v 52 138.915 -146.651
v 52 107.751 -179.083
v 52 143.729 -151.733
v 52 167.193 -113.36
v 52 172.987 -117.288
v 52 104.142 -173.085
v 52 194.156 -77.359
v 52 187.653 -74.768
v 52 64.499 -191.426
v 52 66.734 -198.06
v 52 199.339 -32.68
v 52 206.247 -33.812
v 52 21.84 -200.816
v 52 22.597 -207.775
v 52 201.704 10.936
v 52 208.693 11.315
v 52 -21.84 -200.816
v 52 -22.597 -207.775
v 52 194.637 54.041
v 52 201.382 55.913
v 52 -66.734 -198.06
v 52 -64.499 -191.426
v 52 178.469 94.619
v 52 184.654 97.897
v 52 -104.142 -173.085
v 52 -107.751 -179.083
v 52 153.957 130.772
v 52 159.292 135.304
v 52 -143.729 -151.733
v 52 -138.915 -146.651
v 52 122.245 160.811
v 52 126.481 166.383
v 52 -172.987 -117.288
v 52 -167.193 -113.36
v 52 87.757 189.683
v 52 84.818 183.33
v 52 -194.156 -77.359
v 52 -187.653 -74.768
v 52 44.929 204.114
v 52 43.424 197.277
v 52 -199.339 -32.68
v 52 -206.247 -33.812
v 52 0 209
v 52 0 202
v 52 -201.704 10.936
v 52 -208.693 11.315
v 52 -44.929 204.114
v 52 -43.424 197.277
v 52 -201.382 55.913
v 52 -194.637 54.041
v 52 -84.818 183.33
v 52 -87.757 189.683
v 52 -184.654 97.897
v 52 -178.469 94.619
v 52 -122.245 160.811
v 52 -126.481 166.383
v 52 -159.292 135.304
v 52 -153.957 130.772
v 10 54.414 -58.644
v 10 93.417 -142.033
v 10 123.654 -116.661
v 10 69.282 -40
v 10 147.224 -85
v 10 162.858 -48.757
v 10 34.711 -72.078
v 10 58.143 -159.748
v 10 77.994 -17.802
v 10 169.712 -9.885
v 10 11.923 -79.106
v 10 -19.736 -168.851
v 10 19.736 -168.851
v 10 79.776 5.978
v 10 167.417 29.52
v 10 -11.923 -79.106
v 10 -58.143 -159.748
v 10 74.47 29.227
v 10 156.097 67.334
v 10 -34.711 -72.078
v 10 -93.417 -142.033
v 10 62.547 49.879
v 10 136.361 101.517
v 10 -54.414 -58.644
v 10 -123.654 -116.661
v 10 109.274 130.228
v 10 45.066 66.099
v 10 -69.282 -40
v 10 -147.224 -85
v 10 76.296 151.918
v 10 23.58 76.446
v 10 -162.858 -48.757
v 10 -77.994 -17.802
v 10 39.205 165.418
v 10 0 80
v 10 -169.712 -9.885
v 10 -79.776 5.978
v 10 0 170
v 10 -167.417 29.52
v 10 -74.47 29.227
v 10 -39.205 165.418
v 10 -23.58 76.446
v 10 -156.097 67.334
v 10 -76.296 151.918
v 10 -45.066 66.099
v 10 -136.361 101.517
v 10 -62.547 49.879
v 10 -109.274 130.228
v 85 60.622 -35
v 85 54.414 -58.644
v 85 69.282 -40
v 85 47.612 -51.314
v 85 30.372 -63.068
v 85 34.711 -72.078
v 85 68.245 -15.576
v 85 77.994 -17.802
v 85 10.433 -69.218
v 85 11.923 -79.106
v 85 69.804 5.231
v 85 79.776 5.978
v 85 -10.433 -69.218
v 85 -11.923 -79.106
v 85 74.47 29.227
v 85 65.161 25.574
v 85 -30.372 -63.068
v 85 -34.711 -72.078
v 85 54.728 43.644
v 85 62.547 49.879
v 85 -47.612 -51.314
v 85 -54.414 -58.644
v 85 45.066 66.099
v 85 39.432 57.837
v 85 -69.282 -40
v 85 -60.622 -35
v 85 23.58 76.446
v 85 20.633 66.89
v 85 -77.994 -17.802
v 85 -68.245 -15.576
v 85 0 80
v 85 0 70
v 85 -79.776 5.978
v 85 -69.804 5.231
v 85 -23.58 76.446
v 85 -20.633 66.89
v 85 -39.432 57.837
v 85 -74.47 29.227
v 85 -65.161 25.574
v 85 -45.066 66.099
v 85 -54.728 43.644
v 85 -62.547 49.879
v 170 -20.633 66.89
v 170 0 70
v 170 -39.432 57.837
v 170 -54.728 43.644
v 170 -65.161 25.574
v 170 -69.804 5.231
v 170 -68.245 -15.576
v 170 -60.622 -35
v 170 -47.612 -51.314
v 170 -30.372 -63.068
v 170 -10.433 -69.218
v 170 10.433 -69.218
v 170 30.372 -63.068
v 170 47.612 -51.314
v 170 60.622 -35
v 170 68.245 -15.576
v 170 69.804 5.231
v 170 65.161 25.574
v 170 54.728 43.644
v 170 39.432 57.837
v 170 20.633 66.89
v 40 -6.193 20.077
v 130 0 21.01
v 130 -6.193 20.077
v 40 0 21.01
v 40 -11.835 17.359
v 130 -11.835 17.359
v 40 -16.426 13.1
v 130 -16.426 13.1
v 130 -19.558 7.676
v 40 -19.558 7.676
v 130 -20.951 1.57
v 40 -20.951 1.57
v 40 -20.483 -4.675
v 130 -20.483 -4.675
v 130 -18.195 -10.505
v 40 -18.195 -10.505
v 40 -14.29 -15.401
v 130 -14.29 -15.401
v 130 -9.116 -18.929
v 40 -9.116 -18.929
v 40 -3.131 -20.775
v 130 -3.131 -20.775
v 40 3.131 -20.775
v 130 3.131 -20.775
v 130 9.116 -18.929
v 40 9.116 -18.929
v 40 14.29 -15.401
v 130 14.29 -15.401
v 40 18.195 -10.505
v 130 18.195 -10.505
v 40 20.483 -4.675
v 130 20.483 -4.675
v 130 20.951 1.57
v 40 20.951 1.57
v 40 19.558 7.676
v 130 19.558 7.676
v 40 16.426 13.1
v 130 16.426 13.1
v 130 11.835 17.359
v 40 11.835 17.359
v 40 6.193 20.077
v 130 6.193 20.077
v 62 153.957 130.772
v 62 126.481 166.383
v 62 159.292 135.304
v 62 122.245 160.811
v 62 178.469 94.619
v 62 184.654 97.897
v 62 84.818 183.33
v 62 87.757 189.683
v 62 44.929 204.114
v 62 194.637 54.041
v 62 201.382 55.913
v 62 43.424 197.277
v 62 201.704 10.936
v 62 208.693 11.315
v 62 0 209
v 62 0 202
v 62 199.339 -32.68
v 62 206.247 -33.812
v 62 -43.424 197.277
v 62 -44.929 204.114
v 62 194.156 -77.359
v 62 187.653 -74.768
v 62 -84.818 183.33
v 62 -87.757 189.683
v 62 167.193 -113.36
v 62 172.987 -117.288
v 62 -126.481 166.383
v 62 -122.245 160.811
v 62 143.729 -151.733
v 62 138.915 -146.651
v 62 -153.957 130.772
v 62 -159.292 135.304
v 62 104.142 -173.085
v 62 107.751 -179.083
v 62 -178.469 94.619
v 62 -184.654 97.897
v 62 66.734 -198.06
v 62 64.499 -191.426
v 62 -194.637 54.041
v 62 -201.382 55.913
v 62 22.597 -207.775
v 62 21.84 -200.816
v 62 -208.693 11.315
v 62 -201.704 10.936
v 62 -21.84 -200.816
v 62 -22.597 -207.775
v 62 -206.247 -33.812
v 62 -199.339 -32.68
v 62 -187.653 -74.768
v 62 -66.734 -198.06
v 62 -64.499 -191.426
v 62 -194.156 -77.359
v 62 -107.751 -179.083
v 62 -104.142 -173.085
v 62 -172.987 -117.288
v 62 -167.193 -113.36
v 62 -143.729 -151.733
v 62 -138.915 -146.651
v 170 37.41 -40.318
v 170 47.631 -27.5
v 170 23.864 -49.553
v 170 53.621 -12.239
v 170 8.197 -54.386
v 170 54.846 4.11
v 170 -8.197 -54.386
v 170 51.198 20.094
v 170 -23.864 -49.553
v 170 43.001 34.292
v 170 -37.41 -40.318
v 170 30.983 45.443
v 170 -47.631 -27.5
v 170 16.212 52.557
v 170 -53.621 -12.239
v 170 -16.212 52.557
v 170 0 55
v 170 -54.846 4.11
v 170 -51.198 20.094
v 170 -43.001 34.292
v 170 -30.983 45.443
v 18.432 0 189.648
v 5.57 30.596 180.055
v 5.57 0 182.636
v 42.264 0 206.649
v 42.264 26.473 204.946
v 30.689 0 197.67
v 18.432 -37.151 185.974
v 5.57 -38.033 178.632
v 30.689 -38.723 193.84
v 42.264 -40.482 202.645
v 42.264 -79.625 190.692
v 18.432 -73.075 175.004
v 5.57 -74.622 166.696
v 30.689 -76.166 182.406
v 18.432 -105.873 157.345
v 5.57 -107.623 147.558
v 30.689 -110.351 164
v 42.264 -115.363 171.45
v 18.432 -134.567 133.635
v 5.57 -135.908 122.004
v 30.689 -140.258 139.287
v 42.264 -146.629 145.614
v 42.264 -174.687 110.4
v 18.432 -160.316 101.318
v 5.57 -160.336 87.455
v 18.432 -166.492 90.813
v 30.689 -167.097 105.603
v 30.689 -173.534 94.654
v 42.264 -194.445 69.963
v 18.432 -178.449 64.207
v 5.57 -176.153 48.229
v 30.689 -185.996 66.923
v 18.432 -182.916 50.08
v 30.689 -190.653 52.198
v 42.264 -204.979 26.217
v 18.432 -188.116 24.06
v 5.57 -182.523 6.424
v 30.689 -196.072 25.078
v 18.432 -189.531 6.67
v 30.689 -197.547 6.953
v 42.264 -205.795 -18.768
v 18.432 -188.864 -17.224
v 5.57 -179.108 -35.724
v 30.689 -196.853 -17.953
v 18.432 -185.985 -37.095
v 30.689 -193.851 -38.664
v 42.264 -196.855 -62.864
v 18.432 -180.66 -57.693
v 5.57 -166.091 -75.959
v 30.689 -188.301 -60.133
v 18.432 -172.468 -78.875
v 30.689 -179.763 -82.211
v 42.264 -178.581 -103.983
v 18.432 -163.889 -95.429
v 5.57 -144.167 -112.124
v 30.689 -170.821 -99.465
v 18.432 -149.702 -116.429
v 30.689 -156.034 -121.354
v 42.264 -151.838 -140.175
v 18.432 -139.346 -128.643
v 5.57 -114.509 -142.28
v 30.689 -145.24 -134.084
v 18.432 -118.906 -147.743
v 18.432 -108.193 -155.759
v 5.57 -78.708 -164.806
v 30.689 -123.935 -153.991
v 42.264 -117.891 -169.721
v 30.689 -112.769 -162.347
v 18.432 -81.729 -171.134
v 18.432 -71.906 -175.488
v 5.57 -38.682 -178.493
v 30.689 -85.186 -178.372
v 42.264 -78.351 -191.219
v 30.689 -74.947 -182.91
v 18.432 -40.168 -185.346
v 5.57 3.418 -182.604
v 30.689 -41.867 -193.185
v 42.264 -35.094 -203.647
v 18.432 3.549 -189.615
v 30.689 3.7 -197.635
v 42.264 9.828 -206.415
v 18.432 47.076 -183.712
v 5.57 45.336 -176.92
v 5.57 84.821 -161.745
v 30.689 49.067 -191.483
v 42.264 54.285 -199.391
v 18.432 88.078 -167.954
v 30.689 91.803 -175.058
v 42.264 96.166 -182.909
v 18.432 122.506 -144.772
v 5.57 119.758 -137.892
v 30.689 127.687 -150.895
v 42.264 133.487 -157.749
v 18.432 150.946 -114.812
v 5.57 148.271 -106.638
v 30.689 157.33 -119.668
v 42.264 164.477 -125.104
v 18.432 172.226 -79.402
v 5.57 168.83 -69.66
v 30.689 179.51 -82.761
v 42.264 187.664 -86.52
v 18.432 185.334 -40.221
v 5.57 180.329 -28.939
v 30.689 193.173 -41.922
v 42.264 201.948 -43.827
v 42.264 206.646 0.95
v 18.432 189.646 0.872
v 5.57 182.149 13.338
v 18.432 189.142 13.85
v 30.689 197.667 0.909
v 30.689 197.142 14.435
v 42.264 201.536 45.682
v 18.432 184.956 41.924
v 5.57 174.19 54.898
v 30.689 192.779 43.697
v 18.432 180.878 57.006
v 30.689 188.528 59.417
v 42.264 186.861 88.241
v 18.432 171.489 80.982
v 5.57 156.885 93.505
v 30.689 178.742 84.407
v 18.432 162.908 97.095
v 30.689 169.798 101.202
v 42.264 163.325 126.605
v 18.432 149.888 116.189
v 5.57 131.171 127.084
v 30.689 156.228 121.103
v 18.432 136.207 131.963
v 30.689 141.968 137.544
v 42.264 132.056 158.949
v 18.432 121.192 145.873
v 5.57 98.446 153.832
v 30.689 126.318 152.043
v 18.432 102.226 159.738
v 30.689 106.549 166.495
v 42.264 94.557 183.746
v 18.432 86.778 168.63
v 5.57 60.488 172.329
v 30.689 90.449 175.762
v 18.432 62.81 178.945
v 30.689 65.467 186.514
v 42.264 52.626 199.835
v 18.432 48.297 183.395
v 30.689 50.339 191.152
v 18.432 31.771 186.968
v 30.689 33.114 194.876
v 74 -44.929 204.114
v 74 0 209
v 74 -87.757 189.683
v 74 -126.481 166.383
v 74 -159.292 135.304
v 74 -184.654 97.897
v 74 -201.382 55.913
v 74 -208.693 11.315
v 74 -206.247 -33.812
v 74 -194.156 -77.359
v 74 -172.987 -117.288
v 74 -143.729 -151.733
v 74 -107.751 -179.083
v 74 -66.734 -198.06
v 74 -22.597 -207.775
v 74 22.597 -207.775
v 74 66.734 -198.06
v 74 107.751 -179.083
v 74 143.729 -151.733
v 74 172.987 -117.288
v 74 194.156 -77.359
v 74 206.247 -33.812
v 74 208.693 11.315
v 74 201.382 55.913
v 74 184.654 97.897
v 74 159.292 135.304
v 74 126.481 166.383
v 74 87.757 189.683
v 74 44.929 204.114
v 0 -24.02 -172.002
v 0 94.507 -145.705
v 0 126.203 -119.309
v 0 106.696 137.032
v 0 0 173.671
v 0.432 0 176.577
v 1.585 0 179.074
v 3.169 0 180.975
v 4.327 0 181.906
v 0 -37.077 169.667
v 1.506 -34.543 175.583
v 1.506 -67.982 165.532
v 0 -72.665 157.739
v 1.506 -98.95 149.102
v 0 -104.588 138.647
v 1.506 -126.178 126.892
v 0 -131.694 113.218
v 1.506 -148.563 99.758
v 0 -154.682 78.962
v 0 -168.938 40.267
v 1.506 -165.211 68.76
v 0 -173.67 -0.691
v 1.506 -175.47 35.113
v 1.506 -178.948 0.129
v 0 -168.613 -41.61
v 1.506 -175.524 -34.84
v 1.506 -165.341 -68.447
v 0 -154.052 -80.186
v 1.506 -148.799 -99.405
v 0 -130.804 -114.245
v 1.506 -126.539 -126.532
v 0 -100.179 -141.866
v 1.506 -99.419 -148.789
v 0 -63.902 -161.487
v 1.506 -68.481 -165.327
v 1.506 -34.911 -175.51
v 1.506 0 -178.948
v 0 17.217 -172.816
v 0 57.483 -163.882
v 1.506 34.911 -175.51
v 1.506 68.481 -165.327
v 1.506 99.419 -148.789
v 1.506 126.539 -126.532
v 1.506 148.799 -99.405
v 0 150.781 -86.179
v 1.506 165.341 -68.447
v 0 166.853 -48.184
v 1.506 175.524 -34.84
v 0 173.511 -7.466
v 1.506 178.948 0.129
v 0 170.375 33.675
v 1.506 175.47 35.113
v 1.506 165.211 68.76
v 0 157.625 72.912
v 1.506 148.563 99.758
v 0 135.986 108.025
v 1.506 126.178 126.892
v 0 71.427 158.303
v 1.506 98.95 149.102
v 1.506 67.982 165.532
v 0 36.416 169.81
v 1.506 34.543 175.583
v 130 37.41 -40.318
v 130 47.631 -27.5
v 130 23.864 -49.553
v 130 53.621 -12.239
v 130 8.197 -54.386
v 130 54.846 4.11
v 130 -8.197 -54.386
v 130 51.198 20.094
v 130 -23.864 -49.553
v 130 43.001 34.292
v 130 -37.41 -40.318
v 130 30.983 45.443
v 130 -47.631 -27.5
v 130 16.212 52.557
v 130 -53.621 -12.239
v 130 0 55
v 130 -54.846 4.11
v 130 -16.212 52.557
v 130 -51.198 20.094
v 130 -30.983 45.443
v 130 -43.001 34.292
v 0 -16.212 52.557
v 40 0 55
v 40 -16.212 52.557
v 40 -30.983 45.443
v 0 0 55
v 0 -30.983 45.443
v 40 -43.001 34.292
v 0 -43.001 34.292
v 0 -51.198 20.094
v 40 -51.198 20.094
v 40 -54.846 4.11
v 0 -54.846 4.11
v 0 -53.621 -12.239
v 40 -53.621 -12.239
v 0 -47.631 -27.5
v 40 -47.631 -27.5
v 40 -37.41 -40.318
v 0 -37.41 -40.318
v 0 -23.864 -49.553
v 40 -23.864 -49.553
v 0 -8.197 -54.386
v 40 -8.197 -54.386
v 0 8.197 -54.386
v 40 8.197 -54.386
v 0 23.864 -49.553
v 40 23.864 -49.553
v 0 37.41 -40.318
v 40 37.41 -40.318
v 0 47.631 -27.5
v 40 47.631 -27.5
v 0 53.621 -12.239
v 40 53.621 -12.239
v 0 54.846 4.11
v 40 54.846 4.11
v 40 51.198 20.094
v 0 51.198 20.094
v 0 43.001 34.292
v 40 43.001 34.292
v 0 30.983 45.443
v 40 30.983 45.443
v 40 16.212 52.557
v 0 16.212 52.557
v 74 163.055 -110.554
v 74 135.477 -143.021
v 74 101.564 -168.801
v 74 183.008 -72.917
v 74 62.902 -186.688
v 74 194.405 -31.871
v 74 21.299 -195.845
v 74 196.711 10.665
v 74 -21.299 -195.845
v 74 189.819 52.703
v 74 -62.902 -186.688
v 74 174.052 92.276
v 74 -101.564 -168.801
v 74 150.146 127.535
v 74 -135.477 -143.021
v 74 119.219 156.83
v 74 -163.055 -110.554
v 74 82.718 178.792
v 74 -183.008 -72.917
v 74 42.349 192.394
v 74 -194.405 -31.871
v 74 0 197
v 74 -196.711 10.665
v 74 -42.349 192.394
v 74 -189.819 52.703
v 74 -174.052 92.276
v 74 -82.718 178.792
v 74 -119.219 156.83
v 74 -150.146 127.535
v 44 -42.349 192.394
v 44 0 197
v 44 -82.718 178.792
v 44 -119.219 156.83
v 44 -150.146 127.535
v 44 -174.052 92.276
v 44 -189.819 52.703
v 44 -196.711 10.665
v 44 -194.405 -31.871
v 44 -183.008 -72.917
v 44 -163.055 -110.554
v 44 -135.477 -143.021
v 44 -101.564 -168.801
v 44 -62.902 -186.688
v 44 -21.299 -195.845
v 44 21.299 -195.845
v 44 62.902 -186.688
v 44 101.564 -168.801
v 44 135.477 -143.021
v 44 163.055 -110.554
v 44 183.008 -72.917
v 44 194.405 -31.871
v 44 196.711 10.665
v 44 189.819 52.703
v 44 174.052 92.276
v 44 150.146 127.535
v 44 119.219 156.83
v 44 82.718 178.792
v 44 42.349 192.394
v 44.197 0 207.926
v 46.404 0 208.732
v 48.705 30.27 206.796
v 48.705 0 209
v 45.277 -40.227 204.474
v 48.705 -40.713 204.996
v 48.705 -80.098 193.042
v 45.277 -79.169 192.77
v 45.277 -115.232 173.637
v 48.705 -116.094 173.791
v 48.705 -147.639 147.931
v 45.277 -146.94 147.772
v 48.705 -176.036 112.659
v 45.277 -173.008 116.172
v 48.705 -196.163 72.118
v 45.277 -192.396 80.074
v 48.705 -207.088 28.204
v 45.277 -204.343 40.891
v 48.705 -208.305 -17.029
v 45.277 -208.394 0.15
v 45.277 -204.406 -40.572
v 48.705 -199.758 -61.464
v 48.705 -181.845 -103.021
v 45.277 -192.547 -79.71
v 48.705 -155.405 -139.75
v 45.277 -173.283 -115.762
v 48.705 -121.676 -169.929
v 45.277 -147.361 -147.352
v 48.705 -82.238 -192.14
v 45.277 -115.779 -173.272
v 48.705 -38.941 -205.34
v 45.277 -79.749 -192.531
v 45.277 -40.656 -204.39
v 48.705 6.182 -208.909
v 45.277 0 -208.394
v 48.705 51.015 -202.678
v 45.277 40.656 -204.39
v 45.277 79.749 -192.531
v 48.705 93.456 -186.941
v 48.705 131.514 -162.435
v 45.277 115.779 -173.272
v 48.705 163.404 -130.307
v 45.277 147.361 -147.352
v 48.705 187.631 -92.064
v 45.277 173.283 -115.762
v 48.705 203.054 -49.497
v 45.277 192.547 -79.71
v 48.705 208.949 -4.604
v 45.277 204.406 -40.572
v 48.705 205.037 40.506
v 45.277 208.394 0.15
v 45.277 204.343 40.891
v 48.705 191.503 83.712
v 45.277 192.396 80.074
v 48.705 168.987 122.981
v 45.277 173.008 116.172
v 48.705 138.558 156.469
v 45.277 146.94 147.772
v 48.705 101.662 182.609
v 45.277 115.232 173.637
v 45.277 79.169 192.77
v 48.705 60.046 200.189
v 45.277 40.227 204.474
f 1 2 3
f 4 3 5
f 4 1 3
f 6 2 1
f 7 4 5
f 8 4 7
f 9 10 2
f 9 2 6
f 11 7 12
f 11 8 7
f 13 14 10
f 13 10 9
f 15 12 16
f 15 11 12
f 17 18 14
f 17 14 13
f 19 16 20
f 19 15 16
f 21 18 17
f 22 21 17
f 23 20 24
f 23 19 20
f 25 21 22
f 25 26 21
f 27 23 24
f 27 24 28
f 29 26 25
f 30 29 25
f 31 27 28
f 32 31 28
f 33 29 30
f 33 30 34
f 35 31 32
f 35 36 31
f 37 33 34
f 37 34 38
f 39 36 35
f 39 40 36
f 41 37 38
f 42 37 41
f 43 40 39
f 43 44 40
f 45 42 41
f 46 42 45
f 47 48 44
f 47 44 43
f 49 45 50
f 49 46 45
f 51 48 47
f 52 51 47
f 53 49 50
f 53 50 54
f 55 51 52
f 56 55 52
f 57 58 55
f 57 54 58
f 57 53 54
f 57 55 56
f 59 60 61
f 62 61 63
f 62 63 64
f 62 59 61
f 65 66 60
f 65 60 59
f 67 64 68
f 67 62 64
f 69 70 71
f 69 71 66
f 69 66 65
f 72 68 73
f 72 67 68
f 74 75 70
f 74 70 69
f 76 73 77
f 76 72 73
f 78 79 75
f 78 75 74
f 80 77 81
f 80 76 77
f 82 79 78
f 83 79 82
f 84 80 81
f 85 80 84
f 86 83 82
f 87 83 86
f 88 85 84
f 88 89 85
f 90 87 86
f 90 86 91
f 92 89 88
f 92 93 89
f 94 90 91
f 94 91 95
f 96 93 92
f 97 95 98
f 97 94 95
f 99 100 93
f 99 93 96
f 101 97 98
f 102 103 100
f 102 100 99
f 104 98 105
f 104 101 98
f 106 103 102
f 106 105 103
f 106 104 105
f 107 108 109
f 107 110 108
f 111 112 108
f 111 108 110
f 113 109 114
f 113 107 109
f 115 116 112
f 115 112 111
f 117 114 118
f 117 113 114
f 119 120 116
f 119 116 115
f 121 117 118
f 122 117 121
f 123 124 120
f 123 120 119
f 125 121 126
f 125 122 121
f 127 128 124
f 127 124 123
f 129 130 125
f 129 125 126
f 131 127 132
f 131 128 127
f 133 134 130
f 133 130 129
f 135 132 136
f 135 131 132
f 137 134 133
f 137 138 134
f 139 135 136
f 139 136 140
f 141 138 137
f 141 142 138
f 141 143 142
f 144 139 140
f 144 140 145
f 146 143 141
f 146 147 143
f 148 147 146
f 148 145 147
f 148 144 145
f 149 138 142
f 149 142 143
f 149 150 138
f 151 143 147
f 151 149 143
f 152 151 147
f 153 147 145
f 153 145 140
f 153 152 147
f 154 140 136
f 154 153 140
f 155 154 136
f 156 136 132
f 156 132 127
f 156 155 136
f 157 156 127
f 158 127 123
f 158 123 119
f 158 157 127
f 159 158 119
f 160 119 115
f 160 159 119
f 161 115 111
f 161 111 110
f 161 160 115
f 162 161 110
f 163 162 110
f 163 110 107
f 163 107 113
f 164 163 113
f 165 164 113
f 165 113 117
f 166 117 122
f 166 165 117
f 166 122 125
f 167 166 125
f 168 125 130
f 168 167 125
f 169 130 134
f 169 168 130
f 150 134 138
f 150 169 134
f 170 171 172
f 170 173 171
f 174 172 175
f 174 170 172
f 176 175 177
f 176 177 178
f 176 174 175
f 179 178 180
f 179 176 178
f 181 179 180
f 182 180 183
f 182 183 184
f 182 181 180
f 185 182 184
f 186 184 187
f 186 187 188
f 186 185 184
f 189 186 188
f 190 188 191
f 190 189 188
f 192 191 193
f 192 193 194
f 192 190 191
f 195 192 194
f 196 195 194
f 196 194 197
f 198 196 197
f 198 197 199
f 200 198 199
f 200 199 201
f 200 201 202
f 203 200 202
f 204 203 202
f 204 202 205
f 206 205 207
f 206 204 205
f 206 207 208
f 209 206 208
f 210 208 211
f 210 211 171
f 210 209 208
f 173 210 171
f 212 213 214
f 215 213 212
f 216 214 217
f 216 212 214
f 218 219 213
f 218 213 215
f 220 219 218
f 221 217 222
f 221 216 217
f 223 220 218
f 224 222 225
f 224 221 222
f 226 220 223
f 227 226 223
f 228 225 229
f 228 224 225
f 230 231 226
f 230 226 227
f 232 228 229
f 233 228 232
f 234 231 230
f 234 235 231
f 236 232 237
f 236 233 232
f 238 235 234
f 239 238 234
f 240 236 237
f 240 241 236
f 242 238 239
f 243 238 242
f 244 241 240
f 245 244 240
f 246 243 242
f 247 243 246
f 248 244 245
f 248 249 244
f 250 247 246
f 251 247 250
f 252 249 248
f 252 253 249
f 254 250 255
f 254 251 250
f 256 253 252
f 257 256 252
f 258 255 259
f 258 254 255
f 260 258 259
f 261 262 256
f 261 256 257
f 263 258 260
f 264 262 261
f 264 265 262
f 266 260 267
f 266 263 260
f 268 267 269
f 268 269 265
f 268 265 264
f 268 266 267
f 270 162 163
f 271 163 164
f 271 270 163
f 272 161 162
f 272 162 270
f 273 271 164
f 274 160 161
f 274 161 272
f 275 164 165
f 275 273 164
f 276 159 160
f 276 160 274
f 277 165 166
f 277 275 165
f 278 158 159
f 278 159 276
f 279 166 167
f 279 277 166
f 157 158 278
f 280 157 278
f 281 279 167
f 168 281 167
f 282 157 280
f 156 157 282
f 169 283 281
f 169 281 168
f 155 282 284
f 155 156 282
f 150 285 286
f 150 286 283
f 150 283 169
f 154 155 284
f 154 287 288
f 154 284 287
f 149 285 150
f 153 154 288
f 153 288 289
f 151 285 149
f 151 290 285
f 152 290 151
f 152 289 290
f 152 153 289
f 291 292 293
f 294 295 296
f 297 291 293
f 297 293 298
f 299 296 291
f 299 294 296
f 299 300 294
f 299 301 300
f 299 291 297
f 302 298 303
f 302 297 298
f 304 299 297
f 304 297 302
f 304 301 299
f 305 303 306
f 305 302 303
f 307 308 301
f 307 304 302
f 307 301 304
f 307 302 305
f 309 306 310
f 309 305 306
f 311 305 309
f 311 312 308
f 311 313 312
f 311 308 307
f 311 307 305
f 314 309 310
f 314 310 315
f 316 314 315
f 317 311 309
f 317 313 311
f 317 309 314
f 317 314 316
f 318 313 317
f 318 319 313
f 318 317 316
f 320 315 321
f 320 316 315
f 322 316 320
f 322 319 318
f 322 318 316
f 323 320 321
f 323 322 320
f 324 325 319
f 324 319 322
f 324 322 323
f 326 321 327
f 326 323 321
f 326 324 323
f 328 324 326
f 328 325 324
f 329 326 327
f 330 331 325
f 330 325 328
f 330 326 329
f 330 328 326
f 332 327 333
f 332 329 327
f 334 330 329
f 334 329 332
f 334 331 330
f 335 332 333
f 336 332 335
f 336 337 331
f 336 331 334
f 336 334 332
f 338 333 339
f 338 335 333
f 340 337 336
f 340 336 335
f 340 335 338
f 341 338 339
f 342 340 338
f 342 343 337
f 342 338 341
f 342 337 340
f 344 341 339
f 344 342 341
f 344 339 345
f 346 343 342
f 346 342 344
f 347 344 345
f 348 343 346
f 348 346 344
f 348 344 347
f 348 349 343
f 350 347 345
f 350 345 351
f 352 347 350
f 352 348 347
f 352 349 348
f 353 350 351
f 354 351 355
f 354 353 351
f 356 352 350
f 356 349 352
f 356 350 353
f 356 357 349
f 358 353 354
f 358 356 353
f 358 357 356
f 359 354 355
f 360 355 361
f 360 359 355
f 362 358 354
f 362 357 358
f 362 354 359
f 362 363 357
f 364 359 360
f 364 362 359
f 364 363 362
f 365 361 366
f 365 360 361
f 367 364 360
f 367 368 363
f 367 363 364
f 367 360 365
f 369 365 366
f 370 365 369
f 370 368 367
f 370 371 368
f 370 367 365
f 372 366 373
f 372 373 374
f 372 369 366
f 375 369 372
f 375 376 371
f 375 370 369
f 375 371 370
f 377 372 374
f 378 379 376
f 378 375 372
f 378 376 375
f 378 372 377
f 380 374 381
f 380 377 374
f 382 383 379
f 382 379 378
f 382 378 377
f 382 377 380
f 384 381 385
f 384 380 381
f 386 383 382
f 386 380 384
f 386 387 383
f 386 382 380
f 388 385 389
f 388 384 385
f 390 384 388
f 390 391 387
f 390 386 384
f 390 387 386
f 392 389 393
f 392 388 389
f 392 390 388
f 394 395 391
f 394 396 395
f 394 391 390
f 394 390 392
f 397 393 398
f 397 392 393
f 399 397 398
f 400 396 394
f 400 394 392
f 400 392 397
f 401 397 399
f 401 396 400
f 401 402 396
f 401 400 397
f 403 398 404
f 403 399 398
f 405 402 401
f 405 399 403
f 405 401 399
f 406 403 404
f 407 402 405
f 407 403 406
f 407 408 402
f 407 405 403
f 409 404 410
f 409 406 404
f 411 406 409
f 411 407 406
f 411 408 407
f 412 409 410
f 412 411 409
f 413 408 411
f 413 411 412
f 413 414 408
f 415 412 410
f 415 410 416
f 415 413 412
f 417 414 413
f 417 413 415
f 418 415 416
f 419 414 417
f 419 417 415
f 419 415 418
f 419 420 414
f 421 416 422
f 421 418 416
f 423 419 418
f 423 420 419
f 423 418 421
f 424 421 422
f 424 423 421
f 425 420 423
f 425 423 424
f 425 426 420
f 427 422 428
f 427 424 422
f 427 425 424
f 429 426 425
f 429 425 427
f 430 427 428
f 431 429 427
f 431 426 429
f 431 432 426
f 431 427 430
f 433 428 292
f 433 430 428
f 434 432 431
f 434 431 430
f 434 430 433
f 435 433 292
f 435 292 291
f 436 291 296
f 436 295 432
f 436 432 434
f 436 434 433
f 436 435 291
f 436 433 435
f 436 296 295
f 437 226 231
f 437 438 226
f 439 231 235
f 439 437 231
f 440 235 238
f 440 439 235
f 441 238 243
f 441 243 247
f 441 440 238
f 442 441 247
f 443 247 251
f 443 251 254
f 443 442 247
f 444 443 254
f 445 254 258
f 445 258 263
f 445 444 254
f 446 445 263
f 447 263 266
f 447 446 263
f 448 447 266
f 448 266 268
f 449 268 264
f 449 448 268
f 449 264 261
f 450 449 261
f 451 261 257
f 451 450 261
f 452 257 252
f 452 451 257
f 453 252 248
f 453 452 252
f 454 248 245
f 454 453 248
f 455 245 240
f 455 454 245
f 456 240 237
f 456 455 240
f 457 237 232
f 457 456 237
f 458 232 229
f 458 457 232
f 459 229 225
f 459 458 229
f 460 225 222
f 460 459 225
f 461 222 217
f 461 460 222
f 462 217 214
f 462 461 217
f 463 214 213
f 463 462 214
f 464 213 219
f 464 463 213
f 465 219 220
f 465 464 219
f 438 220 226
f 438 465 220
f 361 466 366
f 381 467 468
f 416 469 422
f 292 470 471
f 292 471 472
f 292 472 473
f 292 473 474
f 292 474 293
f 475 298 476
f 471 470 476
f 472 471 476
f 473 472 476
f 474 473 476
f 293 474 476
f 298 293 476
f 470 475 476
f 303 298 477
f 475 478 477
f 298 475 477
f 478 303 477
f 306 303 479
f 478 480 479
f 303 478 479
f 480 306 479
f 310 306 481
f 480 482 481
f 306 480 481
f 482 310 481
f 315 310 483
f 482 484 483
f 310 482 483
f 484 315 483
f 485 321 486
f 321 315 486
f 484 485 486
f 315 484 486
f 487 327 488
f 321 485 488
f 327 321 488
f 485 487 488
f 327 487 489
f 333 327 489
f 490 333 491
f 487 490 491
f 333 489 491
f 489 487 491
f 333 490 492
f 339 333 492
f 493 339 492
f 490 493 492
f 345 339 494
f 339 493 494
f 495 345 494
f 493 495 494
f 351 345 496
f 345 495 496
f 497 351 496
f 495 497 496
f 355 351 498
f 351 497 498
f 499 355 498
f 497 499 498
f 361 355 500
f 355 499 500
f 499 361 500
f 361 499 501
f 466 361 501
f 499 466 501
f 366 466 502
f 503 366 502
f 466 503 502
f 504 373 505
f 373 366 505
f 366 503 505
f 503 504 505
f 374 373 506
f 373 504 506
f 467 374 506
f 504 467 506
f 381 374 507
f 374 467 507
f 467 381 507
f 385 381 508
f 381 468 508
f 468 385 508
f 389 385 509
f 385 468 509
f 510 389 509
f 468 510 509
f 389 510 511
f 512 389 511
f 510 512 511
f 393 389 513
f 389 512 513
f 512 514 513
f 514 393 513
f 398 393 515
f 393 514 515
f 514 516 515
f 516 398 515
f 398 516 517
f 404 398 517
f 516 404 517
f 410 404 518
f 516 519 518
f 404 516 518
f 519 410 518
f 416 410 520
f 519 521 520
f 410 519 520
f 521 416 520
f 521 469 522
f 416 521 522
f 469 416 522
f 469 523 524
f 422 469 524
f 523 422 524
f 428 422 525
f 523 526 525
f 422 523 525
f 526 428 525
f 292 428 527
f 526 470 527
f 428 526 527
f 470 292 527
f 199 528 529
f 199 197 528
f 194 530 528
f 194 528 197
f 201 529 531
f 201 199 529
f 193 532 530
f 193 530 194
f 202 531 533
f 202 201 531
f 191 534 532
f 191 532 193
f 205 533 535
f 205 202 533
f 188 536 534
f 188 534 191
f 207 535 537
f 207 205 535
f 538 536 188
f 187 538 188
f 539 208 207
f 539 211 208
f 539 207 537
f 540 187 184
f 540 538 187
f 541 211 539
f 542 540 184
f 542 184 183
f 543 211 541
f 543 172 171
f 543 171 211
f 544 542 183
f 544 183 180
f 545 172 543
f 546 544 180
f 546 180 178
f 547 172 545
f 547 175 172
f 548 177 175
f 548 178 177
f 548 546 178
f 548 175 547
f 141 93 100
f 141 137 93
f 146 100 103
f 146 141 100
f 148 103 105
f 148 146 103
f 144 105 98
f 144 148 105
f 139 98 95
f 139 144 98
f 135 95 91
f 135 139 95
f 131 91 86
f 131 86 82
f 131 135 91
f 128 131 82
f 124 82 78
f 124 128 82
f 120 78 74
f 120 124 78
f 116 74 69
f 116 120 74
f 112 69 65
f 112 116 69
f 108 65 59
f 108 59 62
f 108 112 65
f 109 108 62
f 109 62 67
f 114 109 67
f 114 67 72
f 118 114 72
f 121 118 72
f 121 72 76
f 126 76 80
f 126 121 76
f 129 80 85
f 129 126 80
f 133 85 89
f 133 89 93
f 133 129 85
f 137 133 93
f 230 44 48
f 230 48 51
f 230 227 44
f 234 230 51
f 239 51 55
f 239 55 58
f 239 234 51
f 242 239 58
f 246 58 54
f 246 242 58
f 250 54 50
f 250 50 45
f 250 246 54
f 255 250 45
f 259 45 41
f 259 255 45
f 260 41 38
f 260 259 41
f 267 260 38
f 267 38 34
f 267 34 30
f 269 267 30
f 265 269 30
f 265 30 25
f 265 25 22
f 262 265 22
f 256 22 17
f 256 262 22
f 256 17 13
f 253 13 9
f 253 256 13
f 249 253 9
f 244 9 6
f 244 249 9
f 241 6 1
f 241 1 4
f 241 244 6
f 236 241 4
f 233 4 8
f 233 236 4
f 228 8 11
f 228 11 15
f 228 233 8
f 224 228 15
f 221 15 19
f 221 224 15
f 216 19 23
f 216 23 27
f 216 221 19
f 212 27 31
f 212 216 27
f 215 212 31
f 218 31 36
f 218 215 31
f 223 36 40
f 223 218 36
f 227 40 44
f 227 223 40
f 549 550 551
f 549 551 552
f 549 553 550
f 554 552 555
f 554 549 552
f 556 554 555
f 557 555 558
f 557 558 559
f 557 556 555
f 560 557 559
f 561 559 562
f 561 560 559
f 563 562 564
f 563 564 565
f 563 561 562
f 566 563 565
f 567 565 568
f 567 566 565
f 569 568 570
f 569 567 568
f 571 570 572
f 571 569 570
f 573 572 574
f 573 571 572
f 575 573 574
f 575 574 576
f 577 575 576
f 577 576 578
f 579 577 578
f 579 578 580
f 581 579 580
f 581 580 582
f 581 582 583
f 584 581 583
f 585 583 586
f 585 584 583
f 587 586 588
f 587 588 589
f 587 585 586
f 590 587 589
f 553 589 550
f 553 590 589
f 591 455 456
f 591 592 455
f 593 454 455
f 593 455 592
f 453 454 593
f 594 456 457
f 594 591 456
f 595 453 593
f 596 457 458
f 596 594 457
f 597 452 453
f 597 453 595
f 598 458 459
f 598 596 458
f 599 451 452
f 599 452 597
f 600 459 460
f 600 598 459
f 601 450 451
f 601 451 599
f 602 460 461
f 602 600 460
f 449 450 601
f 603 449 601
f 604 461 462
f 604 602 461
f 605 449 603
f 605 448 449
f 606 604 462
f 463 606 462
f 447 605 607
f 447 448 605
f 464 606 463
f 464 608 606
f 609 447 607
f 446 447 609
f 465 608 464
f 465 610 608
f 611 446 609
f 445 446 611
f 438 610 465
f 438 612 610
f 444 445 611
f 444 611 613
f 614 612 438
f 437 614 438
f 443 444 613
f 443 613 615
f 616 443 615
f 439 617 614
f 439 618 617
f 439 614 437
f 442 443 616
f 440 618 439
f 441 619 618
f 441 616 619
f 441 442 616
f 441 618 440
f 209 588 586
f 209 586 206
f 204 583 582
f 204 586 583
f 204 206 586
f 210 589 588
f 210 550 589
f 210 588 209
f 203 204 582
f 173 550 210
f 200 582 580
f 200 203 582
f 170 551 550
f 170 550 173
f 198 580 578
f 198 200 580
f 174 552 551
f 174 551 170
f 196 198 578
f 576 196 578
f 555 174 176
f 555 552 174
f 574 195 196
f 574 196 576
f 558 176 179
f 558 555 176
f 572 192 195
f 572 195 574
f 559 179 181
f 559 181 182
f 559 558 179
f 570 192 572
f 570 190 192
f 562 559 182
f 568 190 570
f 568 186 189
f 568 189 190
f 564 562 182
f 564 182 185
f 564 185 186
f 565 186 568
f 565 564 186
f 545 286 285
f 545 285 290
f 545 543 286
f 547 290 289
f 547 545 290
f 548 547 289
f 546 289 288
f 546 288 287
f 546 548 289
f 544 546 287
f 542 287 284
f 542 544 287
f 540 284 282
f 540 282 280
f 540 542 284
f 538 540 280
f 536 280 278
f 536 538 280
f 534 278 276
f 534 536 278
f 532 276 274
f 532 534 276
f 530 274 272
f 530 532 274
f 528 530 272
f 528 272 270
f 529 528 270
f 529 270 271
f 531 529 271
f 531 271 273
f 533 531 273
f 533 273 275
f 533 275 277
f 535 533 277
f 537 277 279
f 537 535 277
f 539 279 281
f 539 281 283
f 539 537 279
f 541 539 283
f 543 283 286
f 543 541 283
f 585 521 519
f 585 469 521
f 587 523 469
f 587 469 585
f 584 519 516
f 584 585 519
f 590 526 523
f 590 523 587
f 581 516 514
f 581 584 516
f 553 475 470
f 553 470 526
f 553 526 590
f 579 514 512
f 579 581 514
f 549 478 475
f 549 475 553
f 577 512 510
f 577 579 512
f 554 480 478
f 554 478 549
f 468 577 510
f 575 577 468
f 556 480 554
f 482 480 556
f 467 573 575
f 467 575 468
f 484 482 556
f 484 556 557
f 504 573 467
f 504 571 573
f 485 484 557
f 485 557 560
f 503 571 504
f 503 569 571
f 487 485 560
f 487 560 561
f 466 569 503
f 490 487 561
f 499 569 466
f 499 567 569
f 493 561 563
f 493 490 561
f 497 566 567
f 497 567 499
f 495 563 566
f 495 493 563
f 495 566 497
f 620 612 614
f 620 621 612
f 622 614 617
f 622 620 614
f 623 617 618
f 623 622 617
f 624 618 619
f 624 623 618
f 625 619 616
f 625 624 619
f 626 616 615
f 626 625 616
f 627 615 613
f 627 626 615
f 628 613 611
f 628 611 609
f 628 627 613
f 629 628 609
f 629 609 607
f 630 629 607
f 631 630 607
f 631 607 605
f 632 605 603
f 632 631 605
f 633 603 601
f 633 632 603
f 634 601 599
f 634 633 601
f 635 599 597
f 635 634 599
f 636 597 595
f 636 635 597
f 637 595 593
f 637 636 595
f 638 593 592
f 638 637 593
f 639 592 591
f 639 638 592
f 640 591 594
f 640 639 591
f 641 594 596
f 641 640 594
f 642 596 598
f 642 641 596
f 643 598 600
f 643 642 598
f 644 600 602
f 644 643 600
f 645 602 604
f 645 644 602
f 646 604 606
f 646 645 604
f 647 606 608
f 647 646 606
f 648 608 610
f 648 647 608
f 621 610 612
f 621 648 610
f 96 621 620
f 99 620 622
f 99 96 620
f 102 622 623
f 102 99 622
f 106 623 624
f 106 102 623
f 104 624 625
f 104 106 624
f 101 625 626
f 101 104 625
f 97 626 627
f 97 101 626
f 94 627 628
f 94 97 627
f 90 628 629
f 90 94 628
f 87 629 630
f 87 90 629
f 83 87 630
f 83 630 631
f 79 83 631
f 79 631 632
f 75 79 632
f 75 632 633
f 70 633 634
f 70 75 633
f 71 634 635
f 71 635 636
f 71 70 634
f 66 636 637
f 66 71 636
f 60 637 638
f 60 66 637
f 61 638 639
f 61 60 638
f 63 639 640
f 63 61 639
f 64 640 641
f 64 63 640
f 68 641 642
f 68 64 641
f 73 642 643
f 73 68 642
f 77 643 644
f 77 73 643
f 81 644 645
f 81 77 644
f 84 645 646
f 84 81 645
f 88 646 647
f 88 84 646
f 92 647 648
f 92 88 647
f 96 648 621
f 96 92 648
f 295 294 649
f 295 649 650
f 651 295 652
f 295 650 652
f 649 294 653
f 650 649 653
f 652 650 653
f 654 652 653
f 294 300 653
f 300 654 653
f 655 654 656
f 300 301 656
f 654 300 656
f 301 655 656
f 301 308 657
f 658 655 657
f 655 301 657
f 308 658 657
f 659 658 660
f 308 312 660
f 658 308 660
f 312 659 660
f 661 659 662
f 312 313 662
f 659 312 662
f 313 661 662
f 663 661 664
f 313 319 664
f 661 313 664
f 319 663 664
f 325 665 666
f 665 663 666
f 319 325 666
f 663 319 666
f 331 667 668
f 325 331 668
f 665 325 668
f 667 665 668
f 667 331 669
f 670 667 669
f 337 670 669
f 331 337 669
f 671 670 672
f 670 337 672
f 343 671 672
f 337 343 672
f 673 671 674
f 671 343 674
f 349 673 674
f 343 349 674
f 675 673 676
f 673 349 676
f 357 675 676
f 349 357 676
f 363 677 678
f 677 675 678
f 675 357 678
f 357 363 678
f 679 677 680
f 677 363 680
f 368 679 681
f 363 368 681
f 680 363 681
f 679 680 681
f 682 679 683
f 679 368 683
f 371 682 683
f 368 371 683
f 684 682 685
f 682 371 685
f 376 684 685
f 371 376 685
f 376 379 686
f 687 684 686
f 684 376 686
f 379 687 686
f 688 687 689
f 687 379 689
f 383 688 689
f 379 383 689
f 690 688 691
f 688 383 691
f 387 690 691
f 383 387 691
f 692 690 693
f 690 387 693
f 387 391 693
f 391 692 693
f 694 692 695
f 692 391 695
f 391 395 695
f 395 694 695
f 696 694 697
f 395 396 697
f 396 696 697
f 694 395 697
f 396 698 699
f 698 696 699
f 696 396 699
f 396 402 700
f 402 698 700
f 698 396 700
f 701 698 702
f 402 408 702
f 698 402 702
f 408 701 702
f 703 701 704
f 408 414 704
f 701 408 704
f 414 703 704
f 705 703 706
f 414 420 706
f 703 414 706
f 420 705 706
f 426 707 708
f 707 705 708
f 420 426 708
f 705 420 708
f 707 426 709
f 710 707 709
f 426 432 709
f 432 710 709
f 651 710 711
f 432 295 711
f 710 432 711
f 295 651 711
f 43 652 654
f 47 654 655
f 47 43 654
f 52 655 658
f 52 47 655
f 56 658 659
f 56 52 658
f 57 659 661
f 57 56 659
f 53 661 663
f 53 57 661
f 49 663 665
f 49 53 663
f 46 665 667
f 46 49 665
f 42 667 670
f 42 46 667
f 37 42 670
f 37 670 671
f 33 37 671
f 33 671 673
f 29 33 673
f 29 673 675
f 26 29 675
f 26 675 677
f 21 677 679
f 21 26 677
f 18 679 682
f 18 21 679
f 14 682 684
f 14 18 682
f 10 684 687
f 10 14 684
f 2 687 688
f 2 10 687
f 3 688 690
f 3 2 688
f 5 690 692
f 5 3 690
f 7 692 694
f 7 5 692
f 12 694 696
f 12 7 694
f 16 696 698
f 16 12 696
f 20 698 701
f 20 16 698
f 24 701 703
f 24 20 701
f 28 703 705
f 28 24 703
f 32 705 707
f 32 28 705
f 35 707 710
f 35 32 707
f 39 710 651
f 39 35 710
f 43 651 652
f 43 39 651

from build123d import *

# Parameters (mm, degrees)
FILLET1_R = 10


with BuildPart() as part:
    # Sketch1 → Revolve1 (revolve)
    with BuildSketch(Plane.XY, mode=Mode.PRIVATE) as revolve1_sk:
        with BuildLine():
            Line((170, 55), (130, 55))
            Line((130, 55), (130, 21.009993912))
            Line((130, 21.009993912), (40, 21.009993912))
            Line((40, 21.009993912), (40, 55))
            Line((40, 55), (0, 55))
            Line((0, 55), (0, 180))
            ThreePointArc((0, 180), (23.569740978, 192.840057103), (45, 209))
            Line((45, 209), (52, 209))
            Line((52, 209), (52, 202))
            Line((52, 202), (62, 202))
            Line((62, 202), (62, 209))
            Line((62, 209), (74, 209))
            Line((74, 209), (74, 197))
            Line((74, 197), (44, 197))
            Line((44, 197), (10, 170))
            Line((10, 170), (10, 80))
            Line((10, 80), (85, 80))
            Line((85, 80), (85, 70))
            Line((85, 70), (170, 70))
            Line((170, 70), (170, 55))
        make_face()
    revolve(revolve1_sk.sketch.rotate(Axis((0, 0, 0), (1, 0, 0)), 90), axis=Axis((0, 0, 0), (1, 0, 0)))

    # Fillet1
    fillet1_edges = [part.edges().sort_by_distance(p)[0] for p in [
        (0, 0, -180),
        (45, 0, -209),
    ]]
    fillet(fillet1_edges, radius=FILLET1_R)


solid = part.part
